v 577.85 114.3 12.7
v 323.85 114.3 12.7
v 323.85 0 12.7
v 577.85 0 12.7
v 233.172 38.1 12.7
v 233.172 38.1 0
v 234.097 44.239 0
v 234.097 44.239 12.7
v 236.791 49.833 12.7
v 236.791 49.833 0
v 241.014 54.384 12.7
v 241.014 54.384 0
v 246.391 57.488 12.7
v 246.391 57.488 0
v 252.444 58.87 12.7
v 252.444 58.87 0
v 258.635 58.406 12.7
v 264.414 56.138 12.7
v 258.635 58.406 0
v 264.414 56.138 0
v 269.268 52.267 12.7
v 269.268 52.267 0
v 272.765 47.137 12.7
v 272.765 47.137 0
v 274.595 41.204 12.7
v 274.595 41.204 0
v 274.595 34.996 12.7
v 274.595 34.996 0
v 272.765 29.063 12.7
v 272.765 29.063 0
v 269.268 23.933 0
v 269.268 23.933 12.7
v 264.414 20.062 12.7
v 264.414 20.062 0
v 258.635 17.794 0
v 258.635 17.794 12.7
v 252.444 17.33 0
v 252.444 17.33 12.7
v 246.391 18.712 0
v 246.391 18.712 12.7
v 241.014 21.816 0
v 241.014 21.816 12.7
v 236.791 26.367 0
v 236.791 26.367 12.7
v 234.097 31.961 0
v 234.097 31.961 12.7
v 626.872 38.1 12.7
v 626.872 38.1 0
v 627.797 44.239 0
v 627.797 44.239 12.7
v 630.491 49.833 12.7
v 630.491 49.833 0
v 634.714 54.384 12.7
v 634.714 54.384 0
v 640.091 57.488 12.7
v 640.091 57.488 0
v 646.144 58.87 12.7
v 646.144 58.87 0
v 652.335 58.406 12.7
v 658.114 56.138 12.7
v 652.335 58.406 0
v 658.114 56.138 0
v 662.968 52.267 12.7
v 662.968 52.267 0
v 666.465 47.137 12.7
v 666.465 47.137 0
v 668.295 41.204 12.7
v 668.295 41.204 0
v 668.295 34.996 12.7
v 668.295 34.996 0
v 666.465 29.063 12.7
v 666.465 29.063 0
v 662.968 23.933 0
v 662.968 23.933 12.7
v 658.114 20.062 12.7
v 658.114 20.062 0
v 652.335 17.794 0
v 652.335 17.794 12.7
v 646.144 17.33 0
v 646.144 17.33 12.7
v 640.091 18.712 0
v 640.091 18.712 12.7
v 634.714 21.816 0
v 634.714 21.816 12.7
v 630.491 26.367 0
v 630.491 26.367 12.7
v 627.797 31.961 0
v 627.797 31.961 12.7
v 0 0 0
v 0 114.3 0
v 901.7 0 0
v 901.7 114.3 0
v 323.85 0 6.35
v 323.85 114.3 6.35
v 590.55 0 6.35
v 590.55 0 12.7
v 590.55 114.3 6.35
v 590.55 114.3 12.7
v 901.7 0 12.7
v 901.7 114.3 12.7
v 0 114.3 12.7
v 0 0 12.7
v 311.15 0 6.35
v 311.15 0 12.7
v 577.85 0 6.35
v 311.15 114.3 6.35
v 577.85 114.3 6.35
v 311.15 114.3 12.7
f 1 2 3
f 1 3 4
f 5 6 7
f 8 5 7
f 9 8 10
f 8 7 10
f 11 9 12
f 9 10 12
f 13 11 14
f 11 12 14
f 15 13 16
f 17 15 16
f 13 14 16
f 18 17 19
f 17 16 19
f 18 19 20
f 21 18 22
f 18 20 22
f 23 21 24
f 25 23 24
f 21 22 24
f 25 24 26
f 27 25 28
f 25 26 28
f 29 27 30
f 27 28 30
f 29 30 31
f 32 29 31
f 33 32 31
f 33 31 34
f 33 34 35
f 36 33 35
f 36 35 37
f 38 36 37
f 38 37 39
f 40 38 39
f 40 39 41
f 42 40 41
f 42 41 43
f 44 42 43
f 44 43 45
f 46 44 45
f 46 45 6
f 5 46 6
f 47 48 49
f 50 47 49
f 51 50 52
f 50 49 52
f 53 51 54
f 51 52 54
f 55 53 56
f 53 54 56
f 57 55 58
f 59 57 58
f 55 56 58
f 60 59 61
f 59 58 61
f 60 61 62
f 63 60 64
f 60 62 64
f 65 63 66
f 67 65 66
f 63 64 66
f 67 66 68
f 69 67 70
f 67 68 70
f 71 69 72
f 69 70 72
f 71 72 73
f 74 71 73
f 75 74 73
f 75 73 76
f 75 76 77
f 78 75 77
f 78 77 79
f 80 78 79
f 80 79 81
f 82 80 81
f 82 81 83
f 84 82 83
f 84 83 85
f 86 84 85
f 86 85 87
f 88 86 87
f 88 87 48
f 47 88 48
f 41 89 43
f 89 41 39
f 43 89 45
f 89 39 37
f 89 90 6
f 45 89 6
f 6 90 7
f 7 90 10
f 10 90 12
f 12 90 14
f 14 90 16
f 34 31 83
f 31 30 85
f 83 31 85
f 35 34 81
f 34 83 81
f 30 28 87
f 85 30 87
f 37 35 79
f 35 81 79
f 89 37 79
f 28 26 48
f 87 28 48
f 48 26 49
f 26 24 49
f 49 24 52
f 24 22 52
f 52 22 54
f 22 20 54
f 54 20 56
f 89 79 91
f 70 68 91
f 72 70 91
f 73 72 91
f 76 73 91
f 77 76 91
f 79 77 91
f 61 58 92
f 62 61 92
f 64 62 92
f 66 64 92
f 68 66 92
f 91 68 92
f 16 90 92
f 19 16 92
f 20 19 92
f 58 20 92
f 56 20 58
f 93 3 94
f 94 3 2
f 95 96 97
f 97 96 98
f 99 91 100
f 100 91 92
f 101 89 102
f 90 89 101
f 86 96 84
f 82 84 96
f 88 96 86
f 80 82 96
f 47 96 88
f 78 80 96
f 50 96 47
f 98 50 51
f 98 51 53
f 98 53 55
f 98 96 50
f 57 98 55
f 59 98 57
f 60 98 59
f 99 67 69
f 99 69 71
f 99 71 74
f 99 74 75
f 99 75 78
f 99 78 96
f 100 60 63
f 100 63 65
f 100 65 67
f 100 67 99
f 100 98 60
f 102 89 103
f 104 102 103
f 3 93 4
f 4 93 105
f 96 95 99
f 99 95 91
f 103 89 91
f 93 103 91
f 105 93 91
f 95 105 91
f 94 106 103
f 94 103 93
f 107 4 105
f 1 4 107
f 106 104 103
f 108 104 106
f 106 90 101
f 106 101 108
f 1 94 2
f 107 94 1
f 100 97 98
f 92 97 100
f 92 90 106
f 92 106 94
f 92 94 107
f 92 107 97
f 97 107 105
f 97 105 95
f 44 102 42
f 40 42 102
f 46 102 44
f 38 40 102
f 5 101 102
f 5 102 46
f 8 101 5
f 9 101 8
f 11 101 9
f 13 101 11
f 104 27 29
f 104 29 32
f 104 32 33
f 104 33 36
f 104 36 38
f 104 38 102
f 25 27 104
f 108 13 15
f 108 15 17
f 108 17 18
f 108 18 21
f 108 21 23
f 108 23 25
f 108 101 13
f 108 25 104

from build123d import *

# Parameters (mm, degrees)
SKETCH1_W           = 901.7
SKETCH1_H           = 114.3
BOSS_EXTRUDE1_DEPTH = 12.7
SKETCH2_W           = 12.7
SKETCH2_H           = 114.3
CUT_EXTRUDE1_DEPTH  = 6.35
CUT_EXTRUDE2_REACH  = 911.004
SKETCH3_R           = 20.828


with BuildPart() as part:
    # Sketch1 → Boss-Extrude1 (new body)
    with BuildSketch(Plane.XY):
        with Locations((450.85, 57.15)):
            Rectangle(SKETCH1_W, SKETCH1_H)
    extrude(amount=BOSS_EXTRUDE1_DEPTH)

    # Sketch2 → Cut-Extrude1 (cut)
    with BuildSketch(Plane.XY.offset(12.7)):
        with Locations((317.5, 57.15)):
            Rectangle(SKETCH2_W, SKETCH2_H)
        with Locations((584.2, 57.15)):
            Rectangle(SKETCH2_W, SKETCH2_H)
    extrude(amount=-CUT_EXTRUDE1_DEPTH, mode=Mode.SUBTRACT)

    # Sketch3 → Cut-Extrude2 (cut, up to next)
    with BuildSketch(Plane(origin=(0, 0, 0), x_dir=(-1, 0, 0), z_dir=(0, 0, -1)), mode=Mode.PRIVATE) as cut_extrude2_sk1:
        with Locations((-647.7, 38.1)):
            Circle(SKETCH3_R)
    cut_extrude2_tool1 = extrude(cut_extrude2_sk1.sketch, amount=-CUT_EXTRUDE2_REACH, mode=Mode.PRIVATE) & part.part
    # Sketch3 → Cut-Extrude2 (cut, up to next)
    with BuildSketch(Plane(origin=(0, 0, 0), x_dir=(-1, 0, 0), z_dir=(0, 0, -1)), mode=Mode.PRIVATE) as cut_extrude2_sk2:
        with Locations((-254, 38.1)):
            Circle(SKETCH3_R)
    cut_extrude2_tool2 = extrude(cut_extrude2_sk2.sketch, amount=-CUT_EXTRUDE2_REACH, mode=Mode.PRIVATE) & part.part
    add(cut_extrude2_tool1.solids().sort_by_distance((647.7, 38.1, 0))[0], mode=Mode.SUBTRACT)
    add(cut_extrude2_tool2.solids().sort_by_distance((254, 38.1, 0))[0], mode=Mode.SUBTRACT)


solid = part.part
